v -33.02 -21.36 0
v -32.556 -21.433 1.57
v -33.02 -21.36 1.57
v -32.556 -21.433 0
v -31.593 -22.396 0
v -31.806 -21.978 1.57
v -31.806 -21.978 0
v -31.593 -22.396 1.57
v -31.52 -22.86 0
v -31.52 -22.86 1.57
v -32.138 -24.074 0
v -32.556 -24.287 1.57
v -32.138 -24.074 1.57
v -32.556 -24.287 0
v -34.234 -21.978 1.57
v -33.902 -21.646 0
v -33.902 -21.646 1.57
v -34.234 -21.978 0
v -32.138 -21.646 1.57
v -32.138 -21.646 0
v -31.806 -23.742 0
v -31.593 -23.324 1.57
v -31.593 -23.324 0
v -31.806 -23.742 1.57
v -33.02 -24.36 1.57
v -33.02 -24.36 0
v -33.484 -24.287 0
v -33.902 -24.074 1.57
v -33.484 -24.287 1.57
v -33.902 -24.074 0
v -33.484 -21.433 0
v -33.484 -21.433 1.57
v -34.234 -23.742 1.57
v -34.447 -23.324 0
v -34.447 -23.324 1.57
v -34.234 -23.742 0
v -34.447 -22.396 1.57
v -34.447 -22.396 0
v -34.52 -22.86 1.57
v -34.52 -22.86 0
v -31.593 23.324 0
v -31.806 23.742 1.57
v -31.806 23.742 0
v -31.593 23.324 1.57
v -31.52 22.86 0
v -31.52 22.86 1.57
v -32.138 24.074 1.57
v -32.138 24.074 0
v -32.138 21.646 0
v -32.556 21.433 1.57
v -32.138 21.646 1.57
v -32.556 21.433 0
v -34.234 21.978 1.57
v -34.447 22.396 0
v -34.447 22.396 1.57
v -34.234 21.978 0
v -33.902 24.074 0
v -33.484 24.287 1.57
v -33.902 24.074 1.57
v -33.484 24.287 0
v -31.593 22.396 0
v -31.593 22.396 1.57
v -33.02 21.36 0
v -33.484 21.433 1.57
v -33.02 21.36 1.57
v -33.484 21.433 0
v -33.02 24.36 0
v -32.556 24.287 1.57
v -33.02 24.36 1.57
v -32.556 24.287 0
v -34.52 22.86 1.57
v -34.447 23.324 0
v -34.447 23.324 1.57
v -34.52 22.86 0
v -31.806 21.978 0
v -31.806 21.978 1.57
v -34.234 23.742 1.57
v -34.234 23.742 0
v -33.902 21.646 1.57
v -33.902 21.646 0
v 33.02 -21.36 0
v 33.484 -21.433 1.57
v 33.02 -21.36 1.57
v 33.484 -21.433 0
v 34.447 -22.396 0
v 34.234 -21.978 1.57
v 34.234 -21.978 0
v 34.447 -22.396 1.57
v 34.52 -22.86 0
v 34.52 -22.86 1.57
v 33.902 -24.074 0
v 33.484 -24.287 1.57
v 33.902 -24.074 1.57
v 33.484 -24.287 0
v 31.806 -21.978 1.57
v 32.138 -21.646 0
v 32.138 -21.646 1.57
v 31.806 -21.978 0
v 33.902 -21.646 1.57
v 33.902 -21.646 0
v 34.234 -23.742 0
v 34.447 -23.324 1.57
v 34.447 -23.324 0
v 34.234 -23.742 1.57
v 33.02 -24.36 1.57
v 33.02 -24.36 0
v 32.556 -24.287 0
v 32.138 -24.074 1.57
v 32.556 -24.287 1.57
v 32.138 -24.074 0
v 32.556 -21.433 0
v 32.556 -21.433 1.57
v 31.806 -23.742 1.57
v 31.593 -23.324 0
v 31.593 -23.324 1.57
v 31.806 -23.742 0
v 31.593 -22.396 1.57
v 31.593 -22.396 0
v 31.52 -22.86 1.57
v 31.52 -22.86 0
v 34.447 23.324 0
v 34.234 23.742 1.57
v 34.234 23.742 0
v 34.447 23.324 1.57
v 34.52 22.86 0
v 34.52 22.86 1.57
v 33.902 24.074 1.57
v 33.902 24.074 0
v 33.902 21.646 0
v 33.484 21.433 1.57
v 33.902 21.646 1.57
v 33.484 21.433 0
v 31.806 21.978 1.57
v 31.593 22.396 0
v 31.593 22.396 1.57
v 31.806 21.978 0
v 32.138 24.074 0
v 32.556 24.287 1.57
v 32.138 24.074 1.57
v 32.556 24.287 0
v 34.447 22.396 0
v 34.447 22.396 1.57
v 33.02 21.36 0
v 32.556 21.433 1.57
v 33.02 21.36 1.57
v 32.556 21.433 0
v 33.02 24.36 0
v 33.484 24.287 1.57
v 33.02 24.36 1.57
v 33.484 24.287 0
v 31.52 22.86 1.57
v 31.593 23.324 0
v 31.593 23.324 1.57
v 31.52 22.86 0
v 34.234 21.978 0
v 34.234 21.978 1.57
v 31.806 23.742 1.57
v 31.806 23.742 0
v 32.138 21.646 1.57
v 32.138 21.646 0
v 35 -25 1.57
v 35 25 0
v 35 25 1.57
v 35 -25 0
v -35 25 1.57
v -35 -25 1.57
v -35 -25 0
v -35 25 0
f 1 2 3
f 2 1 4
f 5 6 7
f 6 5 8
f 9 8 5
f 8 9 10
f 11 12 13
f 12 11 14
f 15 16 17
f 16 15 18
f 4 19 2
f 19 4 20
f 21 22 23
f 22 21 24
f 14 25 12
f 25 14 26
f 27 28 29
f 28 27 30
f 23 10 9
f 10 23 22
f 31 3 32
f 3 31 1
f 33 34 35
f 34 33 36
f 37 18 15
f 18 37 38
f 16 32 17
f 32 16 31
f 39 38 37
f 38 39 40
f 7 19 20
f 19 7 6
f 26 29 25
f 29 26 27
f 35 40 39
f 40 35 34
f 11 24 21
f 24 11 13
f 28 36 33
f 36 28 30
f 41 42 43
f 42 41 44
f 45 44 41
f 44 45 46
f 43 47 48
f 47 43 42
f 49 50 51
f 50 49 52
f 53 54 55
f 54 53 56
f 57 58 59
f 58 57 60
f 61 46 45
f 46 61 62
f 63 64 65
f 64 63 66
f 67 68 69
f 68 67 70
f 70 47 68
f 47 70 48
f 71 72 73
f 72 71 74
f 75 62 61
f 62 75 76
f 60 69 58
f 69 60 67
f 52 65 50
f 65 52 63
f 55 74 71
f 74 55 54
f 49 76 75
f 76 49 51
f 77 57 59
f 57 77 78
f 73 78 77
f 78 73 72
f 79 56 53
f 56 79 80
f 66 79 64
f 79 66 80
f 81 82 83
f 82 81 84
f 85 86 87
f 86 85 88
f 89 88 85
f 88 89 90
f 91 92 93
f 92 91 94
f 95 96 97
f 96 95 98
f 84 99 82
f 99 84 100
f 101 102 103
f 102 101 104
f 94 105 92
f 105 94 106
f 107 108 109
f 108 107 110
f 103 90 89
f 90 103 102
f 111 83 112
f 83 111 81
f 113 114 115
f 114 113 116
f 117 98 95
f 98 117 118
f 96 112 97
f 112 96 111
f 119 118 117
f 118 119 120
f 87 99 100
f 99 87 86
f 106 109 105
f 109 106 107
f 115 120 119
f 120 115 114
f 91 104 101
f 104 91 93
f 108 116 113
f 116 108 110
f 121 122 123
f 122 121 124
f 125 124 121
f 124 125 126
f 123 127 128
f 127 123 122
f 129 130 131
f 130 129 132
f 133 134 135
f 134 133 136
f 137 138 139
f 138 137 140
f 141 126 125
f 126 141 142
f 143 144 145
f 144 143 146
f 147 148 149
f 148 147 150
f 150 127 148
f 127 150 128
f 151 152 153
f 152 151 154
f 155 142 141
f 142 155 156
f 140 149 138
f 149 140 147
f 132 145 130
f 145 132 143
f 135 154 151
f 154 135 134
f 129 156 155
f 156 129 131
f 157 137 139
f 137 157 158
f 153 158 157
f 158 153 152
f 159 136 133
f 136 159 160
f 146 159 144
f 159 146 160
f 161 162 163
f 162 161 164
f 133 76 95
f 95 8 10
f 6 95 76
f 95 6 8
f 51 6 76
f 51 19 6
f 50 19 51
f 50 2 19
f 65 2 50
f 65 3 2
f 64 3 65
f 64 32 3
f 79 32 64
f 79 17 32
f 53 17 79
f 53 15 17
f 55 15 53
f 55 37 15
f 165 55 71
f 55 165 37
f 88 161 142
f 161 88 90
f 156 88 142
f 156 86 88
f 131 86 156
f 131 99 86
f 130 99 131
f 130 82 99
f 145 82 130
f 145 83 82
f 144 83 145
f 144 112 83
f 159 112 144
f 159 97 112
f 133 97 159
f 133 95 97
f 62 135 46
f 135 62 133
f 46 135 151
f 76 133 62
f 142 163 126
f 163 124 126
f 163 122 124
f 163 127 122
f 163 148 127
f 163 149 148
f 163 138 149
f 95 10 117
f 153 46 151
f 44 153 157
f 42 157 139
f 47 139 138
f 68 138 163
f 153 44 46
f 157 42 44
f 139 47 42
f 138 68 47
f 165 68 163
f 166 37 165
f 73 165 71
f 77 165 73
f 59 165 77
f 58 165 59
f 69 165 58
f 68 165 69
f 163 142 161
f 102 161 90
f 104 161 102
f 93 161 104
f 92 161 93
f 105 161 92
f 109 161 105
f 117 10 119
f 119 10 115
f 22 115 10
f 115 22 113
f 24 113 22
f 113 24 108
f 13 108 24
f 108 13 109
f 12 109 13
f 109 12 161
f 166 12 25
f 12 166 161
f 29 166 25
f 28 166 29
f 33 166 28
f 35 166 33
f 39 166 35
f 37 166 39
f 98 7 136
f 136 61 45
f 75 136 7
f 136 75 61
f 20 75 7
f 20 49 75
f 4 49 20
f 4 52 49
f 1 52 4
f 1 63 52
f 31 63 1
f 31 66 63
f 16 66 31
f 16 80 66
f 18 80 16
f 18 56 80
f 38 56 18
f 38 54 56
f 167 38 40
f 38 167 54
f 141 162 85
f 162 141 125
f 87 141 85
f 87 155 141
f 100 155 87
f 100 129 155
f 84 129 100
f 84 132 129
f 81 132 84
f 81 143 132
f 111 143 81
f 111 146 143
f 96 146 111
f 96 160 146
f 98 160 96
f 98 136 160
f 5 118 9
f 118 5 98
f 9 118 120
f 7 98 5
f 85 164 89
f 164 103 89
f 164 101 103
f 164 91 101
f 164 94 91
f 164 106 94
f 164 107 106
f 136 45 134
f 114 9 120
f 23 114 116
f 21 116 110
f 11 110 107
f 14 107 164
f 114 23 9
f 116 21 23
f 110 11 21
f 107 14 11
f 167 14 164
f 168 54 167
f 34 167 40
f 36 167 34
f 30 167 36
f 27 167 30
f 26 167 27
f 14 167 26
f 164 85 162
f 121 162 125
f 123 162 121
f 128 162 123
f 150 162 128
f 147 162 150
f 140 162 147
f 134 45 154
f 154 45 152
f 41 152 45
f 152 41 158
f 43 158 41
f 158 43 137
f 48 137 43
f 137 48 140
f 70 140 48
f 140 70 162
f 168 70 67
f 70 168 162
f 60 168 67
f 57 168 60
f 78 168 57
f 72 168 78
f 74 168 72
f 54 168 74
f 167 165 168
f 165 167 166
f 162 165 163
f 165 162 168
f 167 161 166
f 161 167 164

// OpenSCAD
// file: ../utils/struct.scad
function get(config, key) = config[search([key], config)[0]][1];

function set(config, key, value) = [for (elem = config) if (elem[0] != key) elem, [key, value]];
    
function join(config1, config2) = [for (elem = config1) elem, for (elem = config2) elem];
// main file
use <../utils/struct.scad>

function Mainboard_config() =
        let (
            pcb_height = 1.57,
            width = 70,
            height = 50,
            bore_diameter = 3,
            bore_spread_w = 26*2.54,
            bore_spread_h = 18*2.54
        ) [
            ["pcb_height", pcb_height],
            ["width", width],
            ["height", height],
            ["bore_diameter", bore_diameter],
            ["bore_spread_w", bore_spread_w],
            ["bore_spread_h", bore_spread_h]
        ];

module Mainboard(config) {
    width = get(config, "width");
    height = get(config, "height");
    bore_spread_w = get(config, "bore_spread_w");
    bore_spread_h = get(config, "bore_spread_h");
    pcb_height = get(config, "pcb_height");
    
    difference() {
        translate([-width/2, -height/2, 0])
        cube([width, height, pcb_height]);
        
        for (i = [-1, 1])
            for (j = [-1, 1])
            translate([
                    i*bore_spread_w/2, 
                    j*bore_spread_h/2,
                    -1])
            cylinder($fn=20, d = get(config, "bore_diameter"), h = 10);
            
        if (false)
            for (r = [0:17])
                for (c = [0:23])
                    translate([(c-11.5)*2.54, (r-8.5)*2.54, -1])
                    cylinder($fn=10, d = 0.5, h = 5);

    }
    
};

Mainboard(Mainboard_config());
